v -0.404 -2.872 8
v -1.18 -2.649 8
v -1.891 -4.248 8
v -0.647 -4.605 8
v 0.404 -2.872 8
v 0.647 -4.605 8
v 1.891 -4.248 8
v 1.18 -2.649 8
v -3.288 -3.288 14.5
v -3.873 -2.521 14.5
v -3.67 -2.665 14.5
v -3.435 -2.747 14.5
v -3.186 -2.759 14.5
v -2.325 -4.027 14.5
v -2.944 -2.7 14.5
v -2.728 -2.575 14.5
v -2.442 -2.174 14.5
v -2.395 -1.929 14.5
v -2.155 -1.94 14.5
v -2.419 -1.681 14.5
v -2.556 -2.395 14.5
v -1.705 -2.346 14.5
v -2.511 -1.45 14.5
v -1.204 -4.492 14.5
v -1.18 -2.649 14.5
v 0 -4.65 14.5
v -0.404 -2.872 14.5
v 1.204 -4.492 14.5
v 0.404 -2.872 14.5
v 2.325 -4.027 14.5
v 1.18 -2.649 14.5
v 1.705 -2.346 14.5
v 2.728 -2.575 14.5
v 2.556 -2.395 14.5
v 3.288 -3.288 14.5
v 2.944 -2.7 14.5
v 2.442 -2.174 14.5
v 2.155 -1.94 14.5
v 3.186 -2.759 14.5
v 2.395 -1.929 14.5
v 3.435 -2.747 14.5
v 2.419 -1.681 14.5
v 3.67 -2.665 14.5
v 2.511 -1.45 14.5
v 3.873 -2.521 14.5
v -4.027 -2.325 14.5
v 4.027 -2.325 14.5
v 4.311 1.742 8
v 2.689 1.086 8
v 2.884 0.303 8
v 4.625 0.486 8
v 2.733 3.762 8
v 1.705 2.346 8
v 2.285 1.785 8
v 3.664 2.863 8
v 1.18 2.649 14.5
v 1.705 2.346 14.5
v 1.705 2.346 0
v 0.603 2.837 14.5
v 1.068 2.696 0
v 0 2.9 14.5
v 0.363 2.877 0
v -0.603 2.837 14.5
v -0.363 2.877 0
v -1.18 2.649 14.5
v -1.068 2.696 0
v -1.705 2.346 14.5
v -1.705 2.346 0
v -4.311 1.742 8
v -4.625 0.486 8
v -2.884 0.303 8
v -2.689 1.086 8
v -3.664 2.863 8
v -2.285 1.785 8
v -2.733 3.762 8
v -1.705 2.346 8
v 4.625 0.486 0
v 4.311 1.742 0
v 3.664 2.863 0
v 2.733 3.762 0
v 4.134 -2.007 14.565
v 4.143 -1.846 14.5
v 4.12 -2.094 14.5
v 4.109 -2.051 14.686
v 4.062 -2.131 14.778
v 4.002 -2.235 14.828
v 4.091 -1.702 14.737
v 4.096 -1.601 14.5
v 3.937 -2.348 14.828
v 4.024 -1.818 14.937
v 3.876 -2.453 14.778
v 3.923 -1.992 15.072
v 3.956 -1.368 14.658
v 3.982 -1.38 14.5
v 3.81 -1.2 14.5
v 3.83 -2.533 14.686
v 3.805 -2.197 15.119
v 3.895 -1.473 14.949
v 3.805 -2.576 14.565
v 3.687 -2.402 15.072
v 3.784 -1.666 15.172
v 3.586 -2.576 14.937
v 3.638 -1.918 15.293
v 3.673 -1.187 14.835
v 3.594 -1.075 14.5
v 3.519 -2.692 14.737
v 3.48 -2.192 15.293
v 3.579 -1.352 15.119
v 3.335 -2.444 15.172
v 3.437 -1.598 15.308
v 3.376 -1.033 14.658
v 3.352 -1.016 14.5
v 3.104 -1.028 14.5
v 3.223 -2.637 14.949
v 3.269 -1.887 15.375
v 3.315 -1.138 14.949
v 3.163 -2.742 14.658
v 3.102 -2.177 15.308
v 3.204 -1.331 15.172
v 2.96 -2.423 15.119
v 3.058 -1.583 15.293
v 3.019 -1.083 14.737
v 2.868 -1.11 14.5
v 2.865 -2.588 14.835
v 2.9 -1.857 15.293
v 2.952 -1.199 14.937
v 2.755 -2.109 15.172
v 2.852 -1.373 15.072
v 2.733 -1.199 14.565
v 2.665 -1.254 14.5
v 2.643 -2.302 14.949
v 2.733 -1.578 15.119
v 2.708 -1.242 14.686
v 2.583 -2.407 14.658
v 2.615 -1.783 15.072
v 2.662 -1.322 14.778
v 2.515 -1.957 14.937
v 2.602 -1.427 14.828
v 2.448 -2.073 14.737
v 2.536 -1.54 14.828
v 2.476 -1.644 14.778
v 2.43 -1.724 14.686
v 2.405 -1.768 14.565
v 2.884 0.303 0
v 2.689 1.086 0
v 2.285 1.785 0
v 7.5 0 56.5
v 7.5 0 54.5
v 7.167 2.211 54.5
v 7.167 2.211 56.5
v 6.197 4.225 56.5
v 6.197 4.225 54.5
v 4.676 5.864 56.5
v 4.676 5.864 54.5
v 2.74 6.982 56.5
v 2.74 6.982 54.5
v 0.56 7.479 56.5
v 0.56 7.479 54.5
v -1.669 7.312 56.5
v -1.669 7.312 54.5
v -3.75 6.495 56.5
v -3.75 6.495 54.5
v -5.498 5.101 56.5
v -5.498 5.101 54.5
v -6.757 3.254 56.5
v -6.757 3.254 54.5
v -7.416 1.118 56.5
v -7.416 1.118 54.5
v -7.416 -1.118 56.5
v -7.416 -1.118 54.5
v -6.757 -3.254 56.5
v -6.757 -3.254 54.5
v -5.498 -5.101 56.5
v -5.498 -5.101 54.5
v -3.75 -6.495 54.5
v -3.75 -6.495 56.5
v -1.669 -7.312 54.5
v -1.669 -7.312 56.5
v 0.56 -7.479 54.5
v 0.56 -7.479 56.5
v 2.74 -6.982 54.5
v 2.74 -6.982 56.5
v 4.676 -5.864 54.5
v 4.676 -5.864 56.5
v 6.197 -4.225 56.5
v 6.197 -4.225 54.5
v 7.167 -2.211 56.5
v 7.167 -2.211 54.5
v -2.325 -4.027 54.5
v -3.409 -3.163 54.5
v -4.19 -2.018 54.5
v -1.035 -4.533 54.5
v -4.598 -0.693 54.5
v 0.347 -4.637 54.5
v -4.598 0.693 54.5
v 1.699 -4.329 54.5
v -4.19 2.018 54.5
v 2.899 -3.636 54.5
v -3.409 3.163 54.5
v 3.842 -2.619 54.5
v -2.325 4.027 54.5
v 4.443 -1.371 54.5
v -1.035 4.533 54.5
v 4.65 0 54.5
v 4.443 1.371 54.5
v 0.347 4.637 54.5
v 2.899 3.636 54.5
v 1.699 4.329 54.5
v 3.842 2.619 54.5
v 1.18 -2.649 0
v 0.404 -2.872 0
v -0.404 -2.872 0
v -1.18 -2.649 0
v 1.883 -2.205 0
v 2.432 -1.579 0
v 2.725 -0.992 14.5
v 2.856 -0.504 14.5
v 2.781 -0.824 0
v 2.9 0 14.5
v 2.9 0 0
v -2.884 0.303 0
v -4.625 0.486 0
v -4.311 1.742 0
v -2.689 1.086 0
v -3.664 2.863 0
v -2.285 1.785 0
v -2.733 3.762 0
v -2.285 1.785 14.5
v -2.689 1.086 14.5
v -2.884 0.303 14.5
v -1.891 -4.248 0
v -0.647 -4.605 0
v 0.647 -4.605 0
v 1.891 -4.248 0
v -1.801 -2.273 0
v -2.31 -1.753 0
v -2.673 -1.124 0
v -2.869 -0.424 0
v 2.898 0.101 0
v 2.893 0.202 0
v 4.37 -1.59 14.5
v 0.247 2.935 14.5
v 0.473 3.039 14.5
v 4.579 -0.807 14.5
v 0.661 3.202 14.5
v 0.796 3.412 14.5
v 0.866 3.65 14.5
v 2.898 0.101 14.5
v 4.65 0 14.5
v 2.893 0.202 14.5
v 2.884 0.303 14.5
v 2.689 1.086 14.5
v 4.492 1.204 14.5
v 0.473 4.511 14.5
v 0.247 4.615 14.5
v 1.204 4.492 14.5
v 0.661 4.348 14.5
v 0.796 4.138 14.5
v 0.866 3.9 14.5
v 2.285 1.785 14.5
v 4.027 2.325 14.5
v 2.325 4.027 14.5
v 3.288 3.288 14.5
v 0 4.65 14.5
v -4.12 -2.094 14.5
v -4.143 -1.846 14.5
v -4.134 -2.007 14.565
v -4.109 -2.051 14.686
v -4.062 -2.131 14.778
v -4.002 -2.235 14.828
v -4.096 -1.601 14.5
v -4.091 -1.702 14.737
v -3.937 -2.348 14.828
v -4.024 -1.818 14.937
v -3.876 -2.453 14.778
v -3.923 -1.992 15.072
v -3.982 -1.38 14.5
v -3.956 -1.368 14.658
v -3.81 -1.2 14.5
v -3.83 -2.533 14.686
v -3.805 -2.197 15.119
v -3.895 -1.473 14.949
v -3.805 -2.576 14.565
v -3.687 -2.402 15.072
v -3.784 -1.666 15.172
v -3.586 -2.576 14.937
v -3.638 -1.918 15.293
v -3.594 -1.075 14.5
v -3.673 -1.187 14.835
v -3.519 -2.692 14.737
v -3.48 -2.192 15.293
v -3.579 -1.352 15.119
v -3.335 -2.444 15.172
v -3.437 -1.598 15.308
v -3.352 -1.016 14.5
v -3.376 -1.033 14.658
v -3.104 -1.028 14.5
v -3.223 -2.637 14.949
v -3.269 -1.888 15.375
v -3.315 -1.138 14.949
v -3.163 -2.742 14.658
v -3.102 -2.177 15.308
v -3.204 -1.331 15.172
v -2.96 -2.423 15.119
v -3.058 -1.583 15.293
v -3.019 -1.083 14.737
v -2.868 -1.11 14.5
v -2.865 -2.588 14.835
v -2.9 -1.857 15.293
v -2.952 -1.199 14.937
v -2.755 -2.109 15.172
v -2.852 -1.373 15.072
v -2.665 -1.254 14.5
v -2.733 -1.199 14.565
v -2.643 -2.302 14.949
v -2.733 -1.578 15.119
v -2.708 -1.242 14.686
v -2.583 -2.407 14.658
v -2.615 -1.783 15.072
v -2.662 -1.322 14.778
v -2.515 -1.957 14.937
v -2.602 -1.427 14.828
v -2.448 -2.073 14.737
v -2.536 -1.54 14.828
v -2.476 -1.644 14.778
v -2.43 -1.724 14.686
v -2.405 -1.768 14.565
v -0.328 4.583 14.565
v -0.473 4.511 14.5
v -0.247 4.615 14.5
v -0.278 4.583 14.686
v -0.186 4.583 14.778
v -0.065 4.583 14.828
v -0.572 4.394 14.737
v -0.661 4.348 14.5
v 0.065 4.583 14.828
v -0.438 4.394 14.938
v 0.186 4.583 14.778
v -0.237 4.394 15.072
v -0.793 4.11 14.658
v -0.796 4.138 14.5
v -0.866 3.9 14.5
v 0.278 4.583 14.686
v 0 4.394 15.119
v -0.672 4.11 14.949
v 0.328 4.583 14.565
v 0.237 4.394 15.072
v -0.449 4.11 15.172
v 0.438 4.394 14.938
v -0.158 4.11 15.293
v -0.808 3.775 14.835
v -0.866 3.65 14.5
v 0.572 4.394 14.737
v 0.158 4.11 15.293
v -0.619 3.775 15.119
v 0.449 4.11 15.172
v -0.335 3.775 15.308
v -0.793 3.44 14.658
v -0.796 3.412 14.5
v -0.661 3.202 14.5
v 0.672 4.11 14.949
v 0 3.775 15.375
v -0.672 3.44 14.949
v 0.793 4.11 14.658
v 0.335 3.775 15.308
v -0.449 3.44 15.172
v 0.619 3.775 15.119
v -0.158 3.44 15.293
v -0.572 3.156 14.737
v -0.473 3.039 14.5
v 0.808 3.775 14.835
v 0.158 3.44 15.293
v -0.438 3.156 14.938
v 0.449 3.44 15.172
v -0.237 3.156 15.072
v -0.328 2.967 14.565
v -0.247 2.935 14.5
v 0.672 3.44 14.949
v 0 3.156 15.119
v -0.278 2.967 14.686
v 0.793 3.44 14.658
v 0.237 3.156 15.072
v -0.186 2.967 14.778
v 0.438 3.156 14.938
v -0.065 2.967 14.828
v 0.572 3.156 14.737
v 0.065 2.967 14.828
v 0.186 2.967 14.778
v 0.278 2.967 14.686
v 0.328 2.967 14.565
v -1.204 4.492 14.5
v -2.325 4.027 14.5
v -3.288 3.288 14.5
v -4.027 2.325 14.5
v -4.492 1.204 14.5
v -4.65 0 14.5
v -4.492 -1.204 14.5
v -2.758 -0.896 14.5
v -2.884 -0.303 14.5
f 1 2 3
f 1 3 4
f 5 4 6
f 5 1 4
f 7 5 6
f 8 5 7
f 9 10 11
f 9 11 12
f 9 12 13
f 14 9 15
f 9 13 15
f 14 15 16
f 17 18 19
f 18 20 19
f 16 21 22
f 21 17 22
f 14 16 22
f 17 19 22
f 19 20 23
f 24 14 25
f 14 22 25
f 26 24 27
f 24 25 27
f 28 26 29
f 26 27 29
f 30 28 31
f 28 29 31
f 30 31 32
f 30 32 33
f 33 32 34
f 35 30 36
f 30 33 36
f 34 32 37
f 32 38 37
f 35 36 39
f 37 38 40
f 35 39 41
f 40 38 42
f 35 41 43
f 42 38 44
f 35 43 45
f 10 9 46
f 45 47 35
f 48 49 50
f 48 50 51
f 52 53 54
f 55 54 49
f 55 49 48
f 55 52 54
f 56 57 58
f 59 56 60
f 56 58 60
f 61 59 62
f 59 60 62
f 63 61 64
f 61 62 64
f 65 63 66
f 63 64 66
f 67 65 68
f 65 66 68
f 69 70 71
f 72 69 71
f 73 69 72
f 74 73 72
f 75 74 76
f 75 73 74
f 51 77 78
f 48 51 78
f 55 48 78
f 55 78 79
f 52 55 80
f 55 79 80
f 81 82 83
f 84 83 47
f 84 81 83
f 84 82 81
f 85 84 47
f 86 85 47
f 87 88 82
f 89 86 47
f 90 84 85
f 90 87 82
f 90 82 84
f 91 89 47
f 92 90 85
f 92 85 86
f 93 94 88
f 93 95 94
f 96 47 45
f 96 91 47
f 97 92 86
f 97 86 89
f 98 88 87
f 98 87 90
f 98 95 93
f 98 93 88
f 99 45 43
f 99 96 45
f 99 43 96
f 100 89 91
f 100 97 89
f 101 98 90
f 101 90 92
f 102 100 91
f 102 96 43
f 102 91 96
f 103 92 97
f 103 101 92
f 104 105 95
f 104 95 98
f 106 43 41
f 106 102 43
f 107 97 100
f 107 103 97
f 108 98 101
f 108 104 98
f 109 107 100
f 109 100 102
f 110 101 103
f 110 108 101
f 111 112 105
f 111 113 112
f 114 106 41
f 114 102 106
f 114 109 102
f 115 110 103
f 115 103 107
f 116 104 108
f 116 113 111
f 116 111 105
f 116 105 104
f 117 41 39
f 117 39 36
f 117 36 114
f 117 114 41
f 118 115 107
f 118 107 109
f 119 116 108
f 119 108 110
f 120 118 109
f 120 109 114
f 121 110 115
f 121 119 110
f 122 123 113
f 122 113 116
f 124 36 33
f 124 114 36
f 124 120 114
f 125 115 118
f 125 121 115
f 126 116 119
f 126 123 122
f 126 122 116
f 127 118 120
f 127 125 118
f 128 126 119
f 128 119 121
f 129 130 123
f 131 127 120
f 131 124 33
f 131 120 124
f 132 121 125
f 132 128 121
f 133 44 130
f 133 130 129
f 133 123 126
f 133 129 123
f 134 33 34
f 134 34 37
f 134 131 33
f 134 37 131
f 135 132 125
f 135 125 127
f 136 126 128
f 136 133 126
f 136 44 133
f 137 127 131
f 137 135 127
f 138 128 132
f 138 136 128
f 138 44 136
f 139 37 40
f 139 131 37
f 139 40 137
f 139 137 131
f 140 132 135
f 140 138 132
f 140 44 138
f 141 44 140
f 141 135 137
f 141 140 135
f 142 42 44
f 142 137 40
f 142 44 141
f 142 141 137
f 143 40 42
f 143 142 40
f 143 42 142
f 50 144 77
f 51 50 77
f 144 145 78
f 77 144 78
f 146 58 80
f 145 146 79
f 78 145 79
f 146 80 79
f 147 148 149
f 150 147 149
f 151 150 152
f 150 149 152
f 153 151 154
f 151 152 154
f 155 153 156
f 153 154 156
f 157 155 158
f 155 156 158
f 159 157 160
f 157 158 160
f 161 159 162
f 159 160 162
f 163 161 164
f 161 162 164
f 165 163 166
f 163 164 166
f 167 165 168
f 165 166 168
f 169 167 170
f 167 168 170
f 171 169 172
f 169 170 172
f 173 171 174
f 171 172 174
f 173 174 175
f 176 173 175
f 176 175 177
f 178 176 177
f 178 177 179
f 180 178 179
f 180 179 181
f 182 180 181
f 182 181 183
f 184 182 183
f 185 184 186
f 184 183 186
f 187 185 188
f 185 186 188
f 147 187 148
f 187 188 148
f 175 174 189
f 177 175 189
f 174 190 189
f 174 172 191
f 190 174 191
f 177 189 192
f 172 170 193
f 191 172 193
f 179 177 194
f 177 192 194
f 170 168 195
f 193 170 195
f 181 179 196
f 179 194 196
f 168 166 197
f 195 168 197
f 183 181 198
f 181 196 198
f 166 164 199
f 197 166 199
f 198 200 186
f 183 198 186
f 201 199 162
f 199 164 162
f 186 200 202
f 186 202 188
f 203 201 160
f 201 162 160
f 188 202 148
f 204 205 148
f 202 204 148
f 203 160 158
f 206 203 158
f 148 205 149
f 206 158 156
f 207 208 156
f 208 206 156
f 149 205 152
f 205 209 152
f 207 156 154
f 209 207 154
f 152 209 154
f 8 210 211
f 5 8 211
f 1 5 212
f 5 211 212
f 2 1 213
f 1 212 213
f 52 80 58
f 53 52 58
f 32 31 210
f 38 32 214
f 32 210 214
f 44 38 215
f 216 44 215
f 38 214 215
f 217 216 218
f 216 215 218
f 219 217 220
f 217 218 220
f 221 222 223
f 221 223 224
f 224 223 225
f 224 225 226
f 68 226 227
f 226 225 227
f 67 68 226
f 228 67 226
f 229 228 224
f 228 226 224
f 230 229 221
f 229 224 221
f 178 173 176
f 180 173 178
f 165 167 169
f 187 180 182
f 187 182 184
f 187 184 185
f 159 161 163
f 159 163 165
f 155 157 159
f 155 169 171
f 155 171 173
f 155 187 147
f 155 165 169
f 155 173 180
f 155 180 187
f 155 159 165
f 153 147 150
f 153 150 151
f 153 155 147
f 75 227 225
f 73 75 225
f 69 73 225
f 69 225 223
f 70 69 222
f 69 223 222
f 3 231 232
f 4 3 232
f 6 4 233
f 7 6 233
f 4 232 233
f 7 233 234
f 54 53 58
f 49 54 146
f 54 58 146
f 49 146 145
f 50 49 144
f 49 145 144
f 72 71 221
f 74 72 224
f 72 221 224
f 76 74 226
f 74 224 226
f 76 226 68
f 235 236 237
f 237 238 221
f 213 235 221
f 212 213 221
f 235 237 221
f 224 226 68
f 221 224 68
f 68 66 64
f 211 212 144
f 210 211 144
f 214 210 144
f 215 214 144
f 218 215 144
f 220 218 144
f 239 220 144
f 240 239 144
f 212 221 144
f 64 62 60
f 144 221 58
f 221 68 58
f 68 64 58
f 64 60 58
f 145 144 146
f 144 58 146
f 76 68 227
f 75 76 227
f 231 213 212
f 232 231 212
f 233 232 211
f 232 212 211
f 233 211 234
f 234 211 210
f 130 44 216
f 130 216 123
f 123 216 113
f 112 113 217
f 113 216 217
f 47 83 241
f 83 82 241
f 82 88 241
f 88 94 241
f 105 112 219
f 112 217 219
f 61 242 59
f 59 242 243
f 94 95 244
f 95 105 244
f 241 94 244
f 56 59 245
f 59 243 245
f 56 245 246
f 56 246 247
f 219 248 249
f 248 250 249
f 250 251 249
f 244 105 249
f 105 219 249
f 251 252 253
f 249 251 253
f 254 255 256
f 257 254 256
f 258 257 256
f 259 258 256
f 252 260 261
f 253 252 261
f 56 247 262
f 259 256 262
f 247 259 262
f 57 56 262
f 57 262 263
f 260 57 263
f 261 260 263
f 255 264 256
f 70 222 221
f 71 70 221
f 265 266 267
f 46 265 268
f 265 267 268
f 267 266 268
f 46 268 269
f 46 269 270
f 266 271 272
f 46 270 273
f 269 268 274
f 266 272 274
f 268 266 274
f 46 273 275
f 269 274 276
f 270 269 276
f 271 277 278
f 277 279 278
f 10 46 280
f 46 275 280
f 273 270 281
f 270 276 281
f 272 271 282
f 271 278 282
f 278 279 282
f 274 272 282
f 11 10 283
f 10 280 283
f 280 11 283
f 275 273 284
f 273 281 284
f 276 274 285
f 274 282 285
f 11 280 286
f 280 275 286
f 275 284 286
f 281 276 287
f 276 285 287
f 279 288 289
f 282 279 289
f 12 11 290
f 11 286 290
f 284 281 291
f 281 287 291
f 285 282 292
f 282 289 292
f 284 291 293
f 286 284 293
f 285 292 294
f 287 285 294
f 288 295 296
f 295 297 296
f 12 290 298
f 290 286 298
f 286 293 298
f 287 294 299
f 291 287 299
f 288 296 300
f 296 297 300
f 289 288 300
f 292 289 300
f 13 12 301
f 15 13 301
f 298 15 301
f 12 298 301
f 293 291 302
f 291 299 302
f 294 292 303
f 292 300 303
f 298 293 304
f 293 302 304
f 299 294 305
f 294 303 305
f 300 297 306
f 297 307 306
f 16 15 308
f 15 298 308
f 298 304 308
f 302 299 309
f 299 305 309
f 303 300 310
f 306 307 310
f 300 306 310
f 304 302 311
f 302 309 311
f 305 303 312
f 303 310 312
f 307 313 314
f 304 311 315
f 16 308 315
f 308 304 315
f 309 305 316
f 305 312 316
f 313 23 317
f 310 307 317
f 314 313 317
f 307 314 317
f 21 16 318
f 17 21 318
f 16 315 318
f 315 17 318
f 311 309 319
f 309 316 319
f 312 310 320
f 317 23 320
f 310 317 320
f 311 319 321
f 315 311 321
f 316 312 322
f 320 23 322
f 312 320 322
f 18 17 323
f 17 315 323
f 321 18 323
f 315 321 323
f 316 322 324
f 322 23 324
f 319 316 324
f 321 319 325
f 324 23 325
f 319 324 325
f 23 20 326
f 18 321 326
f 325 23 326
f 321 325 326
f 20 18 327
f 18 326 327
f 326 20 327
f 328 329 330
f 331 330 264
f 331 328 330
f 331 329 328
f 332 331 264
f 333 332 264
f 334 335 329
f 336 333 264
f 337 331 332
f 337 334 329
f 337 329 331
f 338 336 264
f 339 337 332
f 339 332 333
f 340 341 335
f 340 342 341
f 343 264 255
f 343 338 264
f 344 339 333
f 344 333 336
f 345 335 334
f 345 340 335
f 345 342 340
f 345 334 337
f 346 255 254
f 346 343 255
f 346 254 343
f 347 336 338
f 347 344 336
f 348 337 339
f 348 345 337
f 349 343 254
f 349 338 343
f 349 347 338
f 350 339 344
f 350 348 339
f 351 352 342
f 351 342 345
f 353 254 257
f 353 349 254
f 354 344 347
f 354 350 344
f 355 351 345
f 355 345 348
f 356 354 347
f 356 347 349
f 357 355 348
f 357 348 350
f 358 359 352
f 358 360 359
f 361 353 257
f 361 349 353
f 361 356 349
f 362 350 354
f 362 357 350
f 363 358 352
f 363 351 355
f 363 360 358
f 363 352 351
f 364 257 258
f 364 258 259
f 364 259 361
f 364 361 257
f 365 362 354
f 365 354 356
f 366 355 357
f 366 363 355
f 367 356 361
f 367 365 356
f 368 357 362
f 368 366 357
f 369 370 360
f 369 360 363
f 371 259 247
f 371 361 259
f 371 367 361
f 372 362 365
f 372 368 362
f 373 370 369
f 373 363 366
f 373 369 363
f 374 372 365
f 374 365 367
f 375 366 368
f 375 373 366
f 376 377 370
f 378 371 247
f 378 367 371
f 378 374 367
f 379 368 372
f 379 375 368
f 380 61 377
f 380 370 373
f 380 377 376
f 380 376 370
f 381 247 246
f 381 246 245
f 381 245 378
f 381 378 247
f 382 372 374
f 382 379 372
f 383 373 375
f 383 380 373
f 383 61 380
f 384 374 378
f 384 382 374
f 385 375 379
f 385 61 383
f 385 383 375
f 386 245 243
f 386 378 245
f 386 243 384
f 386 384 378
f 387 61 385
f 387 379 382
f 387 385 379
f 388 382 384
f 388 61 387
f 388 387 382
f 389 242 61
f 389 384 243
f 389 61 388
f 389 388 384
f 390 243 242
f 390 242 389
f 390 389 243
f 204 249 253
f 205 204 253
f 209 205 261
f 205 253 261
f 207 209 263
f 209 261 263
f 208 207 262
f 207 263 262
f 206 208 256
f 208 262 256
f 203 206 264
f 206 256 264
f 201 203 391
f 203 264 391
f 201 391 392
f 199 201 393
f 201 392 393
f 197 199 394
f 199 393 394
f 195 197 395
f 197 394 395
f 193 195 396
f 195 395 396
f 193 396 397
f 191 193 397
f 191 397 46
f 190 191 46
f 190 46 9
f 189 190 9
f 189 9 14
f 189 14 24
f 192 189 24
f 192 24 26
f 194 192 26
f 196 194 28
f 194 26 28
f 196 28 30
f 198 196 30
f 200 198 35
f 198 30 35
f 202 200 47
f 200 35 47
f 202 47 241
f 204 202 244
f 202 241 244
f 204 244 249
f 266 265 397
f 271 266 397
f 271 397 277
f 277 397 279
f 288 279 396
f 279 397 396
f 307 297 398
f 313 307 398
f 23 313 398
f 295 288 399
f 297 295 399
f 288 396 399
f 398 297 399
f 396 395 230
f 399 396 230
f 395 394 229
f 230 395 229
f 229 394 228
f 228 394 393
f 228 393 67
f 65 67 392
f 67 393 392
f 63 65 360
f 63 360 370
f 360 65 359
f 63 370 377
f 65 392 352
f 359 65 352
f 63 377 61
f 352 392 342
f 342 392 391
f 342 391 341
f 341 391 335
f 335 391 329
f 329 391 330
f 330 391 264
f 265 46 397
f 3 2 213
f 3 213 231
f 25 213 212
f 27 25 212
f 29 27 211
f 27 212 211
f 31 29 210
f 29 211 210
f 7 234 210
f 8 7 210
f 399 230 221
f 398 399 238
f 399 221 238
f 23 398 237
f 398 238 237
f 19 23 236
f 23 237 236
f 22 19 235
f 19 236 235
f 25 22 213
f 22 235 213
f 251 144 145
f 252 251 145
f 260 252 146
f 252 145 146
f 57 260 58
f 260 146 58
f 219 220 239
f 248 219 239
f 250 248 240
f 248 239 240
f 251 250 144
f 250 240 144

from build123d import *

# Parameters (mm, degrees)
F1_DEPTH = 8
F2_DEPTH = 14.5
F3_R     = 4.65
F3_R_2   = 2.9
F4_DEPTH = 40
F5_R     = 7.5
F5_R_2   = 4.65
F6_DEPTH = 2


with BuildPart() as f1:
    # F0 (on Top) → F1 (new body)
    with BuildSketch(Plane.XY):
        with BuildLine():
            Line((-1.704577, 2.346149), (-2.733201, 3.761929))
            ThreePointArc((-2.733201, 3.761929), (-4.027018, 2.325), (-4.624527, 0.486057))
            Line((-4.624527, 0.486057), (-2.884113, 0.303133))
            ThreePointArc((-2.884113, 0.303133), (-2.511474, 1.45), (-1.704577, 2.346149))
        make_face()
        with BuildLine():
            Line((2.733201, 3.761929), (1.704577, 2.346149))
            ThreePointArc((1.704577, 2.346149), (2.511474, 1.45), (2.884113, 0.303133))
            Line((2.884113, 0.303133), (4.624527, 0.486057))
            ThreePointArc((4.624527, 0.486057), (4.027018, 2.325), (2.733201, 3.761929))
        make_face()
        with BuildLine():
            ThreePointArc((1.179536, -2.649282), (0, -2.9), (-1.179536, -2.649282))
            Line((-1.179536, -2.649282), (-1.891325, -4.247986))
            ThreePointArc((-1.891325, -4.247986), (0, -4.65), (1.891325, -4.247986))
            Line((1.891325, -4.247986), (1.179536, -2.649282))
        make_face()
    extrude(amount=F1_DEPTH)


with BuildPart() as f2:
    # F0 (on Top) → F2 (new body)
    with BuildSketch(Plane.XY):
        with BuildLine():
            ThreePointArc((1.704577, 2.346149), (0, 2.9), (-1.704577, 2.346149))
            ThreePointArc((-1.704577, 2.346149), (-2.511474, 1.45), (-2.884113, 0.303133))
            ThreePointArc((-2.884113, 0.303133), (-2.511474, -1.45), (-1.179536, -2.649282))
            ThreePointArc((-1.179536, -2.649282), (0, -2.9), (1.179536, -2.649282))
            ThreePointArc((1.179536, -2.649282), (2.432145, -1.579453), (2.9, 0))
            ThreePointArc((2.9, 0), (2.896026, 0.151774), (2.884113, 0.303133))
            ThreePointArc((2.884113, 0.303133), (2.511474, 1.45), (1.704577, 2.346149))
        make_face()
    extrude(amount=F2_DEPTH)

    # F3 (on face) → F4 (join)
    with BuildSketch(Plane.XY.offset(14.5)):
        Circle(F3_R)
        Circle(F3_R_2, mode=Mode.SUBTRACT)
        Circle(F3_R_2)
    extrude(amount=F4_DEPTH)

    # F5 (on face) → F6 (join)
    with BuildSketch(Plane.XY.offset(54.5)):
        Circle(F5_R)
        Circle(F5_R_2, mode=Mode.SUBTRACT)
        Circle(F5_R_2)
    extrude(amount=F6_DEPTH)

    # F7 (on face) → F8 (revolve, cut)
    with BuildSketch(Plane(origin=(0, 0, 14.5), x_dir=(1, 0, 0), z_dir=(0, 0, -1))):
        with BuildLine():
            Line((-2.511474, 1.45), (-4.027018, 2.325))
            ThreePointArc((-4.027018, 2.325), (-3.706746, 1.129728), (-2.511474, 1.45))
        make_face()
    revolve(axis=Axis((-3.269246, -1.8875, 14.5), (0.866025, 0.5, 0)), mode=Mode.SUBTRACT)

    # F7 (on face) → F9 (revolve, cut)
    with BuildSketch(Plane(origin=(0, 0, 14.5), x_dir=(1, 0, 0), z_dir=(0, 0, -1))):
        with BuildLine():
            Line((2.511474, 1.45), (4.027018, 2.325))
            ThreePointArc((4.027018, 2.325), (2.831746, 2.645272), (2.511474, 1.45))
        make_face()
    revolve(axis=Axis((3.269246, -1.8875, 14.5), (0.866025, -0.5, 0)), mode=Mode.SUBTRACT)

    # F7 (on face) → F10 (revolve, cut)
    with BuildSketch(Plane(origin=(0, 0, 14.5), x_dir=(1, 0, 0), z_dir=(0, 0, -1))):
        with BuildLine():
            Line((0, -2.9), (0, -4.65))
            ThreePointArc((0, -4.65), (0.875, -3.775), (0, -2.9))
        make_face()
    revolve(axis=Axis((0, 3.775, 14.5), (0, 1, 0)), mode=Mode.SUBTRACT)


solid = Compound([f1.part, f2.part])
